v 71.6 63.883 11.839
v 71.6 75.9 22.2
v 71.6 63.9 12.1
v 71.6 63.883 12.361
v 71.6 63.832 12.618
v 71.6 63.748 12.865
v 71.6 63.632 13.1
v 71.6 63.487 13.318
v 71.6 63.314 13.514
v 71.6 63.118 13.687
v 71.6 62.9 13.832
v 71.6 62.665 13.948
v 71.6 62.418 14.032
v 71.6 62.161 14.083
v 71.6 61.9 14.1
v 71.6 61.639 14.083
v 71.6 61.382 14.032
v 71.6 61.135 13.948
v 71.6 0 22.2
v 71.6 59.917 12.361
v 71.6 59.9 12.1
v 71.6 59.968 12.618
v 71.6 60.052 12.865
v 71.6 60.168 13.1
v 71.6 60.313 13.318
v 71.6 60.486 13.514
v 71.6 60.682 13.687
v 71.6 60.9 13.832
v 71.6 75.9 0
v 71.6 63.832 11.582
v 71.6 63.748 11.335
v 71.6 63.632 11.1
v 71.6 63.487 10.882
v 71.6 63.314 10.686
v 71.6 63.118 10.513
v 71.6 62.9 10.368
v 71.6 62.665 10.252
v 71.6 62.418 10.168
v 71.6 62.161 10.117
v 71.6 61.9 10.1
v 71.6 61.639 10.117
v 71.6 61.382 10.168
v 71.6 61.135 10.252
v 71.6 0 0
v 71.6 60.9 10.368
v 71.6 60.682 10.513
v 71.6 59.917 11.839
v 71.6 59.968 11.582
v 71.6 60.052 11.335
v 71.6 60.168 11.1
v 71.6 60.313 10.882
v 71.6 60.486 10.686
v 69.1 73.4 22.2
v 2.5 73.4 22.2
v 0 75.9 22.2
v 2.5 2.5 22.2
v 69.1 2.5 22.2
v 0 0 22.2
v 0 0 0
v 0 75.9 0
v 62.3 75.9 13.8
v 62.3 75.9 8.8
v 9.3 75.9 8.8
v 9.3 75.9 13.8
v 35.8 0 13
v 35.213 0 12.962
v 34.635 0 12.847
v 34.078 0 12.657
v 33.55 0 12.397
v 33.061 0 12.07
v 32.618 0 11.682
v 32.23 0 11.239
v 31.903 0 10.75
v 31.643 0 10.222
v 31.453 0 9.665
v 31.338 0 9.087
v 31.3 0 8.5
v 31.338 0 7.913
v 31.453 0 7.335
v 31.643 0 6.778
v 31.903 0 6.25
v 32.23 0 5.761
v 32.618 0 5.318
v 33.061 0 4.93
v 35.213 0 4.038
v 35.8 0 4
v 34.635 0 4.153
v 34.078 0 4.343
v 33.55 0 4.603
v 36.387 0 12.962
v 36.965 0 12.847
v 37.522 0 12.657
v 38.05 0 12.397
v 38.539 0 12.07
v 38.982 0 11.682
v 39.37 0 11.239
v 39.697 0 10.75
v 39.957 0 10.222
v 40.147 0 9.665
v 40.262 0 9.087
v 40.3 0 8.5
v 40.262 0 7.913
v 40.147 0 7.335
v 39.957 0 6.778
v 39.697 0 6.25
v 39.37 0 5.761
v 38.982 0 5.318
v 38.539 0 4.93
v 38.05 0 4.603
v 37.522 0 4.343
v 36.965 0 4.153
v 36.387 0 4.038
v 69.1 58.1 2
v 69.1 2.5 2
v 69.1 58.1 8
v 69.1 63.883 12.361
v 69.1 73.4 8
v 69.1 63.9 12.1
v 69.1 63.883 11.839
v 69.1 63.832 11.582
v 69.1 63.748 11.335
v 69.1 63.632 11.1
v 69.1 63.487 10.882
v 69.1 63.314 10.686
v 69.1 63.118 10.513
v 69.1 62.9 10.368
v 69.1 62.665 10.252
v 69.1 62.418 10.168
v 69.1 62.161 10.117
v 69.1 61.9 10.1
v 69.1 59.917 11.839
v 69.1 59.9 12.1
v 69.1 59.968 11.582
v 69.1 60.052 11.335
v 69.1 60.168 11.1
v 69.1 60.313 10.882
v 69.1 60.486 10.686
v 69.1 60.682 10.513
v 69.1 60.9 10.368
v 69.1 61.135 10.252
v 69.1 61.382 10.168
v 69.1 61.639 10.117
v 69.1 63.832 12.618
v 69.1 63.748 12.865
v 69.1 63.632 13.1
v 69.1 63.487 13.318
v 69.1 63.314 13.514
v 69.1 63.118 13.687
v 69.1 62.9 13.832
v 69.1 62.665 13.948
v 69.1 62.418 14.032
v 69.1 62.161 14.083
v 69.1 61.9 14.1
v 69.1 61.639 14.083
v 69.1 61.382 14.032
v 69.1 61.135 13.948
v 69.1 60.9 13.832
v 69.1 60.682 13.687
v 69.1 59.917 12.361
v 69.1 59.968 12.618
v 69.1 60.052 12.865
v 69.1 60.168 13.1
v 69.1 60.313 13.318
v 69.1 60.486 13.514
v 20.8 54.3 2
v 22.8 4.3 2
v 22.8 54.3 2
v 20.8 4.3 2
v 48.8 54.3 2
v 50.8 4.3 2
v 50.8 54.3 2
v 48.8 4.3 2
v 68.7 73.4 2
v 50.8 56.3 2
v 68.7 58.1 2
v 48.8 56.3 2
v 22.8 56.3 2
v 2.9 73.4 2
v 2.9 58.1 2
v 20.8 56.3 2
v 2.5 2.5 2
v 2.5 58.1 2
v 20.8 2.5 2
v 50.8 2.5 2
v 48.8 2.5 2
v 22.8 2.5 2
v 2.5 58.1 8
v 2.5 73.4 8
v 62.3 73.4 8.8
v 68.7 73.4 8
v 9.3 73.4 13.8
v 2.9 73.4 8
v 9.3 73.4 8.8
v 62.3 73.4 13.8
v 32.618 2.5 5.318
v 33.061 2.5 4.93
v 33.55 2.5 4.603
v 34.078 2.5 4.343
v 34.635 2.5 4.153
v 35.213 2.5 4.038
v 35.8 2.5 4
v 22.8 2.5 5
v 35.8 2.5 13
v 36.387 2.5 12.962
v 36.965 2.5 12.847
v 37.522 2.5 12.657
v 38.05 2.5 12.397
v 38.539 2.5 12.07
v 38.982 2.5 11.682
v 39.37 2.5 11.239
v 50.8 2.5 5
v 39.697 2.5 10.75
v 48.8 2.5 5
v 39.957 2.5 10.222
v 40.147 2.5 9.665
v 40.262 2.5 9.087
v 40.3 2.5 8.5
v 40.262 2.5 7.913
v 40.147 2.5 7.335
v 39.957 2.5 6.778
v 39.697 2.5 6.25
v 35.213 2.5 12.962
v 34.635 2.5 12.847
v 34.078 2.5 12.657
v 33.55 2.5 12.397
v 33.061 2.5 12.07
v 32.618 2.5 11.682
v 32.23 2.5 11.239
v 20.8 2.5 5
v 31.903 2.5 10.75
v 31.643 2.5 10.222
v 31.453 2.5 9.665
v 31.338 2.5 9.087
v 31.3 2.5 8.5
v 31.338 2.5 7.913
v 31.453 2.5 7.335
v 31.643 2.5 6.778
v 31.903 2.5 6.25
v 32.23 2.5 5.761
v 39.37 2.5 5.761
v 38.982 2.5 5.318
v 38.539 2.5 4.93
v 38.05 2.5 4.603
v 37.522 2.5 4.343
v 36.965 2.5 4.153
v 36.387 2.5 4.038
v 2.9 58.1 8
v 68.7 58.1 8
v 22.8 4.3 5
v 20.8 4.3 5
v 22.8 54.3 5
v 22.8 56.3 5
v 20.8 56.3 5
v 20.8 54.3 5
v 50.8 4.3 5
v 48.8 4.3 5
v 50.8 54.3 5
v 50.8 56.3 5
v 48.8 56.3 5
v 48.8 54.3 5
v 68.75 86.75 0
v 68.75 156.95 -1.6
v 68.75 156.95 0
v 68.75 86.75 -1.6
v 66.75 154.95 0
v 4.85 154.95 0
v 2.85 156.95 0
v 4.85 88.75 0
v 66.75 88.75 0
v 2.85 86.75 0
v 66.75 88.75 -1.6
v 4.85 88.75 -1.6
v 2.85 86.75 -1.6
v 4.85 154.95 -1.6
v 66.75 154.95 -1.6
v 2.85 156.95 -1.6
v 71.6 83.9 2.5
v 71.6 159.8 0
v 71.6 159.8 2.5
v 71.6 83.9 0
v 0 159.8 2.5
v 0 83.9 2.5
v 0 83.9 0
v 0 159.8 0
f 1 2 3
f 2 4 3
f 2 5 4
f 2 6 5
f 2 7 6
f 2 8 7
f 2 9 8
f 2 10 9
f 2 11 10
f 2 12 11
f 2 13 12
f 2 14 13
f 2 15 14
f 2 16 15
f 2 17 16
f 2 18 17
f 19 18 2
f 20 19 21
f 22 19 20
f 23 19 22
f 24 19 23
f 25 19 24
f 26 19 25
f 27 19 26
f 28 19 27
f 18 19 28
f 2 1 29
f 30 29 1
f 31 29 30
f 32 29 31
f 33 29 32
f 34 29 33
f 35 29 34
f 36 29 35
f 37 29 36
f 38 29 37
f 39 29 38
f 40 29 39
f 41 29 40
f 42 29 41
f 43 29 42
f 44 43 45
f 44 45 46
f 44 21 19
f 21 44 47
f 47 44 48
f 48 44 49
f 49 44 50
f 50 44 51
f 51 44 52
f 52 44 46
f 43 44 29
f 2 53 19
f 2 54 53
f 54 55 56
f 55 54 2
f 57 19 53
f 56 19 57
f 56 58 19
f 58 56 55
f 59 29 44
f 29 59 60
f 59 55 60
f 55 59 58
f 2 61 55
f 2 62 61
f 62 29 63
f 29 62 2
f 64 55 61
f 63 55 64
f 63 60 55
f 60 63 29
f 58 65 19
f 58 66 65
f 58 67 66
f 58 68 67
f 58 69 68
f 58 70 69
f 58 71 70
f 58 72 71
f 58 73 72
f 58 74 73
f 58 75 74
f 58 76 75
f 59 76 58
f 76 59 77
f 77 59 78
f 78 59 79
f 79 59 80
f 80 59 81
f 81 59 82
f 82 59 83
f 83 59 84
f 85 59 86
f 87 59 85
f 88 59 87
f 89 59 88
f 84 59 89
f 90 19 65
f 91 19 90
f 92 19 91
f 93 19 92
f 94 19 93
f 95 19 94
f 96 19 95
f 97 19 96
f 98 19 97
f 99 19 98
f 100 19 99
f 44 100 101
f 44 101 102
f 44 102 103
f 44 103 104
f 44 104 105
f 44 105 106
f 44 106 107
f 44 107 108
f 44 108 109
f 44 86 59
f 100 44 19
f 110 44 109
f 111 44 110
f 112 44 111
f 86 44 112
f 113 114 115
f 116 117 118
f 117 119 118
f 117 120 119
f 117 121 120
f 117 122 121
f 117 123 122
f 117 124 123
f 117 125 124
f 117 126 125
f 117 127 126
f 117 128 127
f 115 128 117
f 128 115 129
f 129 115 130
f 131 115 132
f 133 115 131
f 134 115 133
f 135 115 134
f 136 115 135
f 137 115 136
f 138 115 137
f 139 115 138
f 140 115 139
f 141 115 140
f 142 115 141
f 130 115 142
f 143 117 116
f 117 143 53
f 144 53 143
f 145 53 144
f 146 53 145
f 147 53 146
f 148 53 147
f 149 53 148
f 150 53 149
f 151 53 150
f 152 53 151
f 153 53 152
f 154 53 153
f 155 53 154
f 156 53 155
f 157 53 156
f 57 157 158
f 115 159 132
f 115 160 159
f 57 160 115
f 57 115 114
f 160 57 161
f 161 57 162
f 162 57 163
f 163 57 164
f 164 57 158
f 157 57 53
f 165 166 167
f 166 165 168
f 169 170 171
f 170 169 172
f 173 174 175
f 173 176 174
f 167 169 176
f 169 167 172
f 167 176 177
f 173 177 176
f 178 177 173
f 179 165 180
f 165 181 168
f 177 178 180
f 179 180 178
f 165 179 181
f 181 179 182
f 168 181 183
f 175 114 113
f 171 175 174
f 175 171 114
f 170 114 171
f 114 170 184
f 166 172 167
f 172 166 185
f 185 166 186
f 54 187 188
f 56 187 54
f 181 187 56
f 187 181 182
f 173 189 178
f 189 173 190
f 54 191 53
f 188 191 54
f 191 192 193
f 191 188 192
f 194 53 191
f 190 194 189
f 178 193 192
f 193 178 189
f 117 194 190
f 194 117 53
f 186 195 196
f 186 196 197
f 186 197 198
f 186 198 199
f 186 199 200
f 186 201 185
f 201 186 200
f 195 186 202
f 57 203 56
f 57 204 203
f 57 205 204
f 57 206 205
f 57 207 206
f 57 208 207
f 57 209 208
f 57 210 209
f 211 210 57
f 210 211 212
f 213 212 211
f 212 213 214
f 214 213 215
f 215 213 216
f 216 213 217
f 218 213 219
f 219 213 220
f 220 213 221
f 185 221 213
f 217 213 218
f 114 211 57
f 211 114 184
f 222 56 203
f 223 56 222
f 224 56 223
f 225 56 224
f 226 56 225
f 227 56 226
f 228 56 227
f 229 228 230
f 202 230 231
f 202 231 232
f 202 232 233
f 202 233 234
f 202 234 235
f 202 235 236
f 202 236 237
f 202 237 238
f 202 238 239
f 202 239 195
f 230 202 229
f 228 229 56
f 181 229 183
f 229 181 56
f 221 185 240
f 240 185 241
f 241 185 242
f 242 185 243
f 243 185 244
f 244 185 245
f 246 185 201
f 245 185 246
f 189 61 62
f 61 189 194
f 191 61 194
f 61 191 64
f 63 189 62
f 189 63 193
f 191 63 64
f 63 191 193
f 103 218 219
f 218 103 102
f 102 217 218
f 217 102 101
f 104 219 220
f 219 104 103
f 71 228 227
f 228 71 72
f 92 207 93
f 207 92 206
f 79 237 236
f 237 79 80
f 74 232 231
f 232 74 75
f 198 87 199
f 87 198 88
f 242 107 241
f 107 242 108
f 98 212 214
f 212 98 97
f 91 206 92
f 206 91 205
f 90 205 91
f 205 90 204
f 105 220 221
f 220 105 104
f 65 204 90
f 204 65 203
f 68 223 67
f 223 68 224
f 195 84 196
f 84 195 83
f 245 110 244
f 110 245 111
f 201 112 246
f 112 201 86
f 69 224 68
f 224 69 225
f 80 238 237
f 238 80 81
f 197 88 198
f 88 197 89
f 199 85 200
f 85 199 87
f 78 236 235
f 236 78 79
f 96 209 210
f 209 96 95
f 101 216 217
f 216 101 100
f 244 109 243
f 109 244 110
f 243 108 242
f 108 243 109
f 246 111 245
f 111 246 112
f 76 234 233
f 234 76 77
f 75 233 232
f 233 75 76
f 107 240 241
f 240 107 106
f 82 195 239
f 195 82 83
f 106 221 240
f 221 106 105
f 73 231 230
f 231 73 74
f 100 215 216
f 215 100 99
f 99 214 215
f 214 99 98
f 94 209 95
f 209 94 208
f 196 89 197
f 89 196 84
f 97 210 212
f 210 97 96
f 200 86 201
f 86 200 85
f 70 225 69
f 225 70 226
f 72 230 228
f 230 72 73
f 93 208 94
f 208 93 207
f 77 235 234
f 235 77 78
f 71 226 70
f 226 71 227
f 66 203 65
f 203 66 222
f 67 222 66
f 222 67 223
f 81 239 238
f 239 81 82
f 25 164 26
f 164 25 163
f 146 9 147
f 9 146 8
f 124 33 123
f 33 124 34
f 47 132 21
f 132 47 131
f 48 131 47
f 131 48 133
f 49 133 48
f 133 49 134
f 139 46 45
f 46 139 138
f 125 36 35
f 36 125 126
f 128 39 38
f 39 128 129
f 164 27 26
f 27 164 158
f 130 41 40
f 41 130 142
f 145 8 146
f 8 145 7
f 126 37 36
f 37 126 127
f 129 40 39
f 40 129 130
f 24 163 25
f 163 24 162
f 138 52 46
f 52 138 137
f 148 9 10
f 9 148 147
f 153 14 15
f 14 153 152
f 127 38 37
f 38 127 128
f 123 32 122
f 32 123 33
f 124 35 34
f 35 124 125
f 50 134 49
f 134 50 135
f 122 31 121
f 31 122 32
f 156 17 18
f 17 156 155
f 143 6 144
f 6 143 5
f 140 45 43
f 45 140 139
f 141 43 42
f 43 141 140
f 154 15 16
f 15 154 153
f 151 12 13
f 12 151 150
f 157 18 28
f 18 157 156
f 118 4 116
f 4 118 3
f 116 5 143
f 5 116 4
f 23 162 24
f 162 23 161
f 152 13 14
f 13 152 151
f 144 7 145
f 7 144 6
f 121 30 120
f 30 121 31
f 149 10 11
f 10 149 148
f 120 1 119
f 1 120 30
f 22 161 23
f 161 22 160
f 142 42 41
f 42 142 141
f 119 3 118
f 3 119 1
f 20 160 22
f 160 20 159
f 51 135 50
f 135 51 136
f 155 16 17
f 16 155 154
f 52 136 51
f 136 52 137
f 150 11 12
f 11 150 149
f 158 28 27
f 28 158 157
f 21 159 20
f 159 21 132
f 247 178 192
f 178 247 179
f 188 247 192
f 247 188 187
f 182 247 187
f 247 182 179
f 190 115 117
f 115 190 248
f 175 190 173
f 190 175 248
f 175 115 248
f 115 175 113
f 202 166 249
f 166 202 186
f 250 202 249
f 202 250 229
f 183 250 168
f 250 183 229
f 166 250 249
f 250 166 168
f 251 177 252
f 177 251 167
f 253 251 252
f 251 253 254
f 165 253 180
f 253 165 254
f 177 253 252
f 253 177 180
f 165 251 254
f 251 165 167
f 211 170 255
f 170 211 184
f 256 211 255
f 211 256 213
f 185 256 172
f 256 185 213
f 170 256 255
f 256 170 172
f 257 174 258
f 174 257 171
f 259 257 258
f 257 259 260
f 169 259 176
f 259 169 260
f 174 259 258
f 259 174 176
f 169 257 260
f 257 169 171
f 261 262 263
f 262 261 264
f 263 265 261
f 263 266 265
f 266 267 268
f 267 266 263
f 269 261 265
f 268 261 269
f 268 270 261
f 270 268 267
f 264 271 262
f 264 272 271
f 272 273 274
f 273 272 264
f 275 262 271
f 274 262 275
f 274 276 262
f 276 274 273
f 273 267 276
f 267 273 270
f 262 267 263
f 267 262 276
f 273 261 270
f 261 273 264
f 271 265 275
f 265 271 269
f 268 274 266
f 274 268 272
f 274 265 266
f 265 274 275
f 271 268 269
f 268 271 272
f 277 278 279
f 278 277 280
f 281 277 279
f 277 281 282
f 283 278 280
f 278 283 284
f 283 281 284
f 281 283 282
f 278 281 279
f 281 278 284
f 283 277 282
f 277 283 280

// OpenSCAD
// ============================================================
//  CYBERTHREAD — printed enclosure (v0, parametric)
//  The coupler drops in at the TOP; fibres exit the top wall
//  and run up to the hair. The ESP32 sits in the body. USB
//  power enters the bottom (battery lives on your belt).
//  Prints as a tray (open top) + a friction-fit lid.
// ============================================================

/* ---- coupler outer size (match your coupler .scad output) ---- */
cpl_l = 65;     // length / hole-row.  144/m = 65,  30/m = 212
cpl_w = 18.6;   // width.              144/m = 18.6, 30/m = 16.6
cpl_h = 12.3;   // height

/* ---- ESP32 board bay   ### CONFIRM your board's real size ### ---- */
esp_l = 52;     // board length (38-pin devkit ~ 52; 30-pin ~ 48)
esp_w = 28;     // board width  (~ 25.4–28)
esp_h = 13;     // height incl. header pins

/* ---- build params ---- */
wall    = 2.5;
floor_t = 2.0;
clr     = 0.8;   // clearance around parts
gap     = 5;     // gap between coupler and ESP bay
usb_d   = 9;     // USB cable pass-through (fits a grommet)
mic_d   = 4;     // mic port
lip     = 1.6;   // lid lip depth
lip_clr = 0.35;  // lid fit clearance
$fn = 48;

/* ---- derived ---- */
in_x  = max(cpl_l, esp_w) + 2*clr;
in_y  = cpl_h + gap + esp_l + 2*clr;
in_z  = max(cpl_w, esp_h) + 2*clr;
out_x = in_x + 2*wall;
out_y = in_y + 2*wall;
tray_h = floor_t + in_z;

// key interior anchors
cpl_y0 = wall + in_y - cpl_h;      // coupler pushed against +Y wall
cpl_x0 = wall + (in_x-cpl_l)/2;
slot_z = floor_t + cpl_w/2;        // fibre row height
esp_y0 = wall + clr;               // ESP at the bottom (low Y)
esp_x0 = wall + (in_x-esp_w)/2;

module tray() {
  difference() {
    cube([out_x, out_y, tray_h]);                 // shell
    translate([wall, wall, floor_t])
      cube([in_x, in_y, in_z + 2]);               // hollow, open top

    // fibre exit slot in +Y wall, aligned to the hole row
    slot_len = cpl_l - 12;
    translate([out_x/2 - slot_len/2, out_y - wall - 0.6, slot_z - 2.5])
      cube([slot_len, wall + 1.2, 5]);

    // USB power entry, -Y wall, at ESP height
    translate([out_x/2, -0.6, floor_t + esp_h/2])
      rotate([-90,0,0]) cylinder(d=usb_d, h=wall+1.2);

    // mic port, +X side wall, up near the coupler end
    translate([out_x-wall-0.6, out_y - 14, floor_t + in_z/2])
      rotate([0,90,0]) cylinder(d=mic_d, h=wall+1.2);
  }

  // coupler locating ribs (stop it sliding in X, hold against +Y wall)
  for (x=[cpl_x0-2.4, cpl_x0+cpl_l+0.4])
    translate([x, cpl_y0-3, floor_t]) cube([2, cpl_h+3, min(cpl_w,6)]);

  // ESP corner nubs (board drops between them; tape/glue to secure)
  for (dx=[0, esp_w], dy=[0, esp_l])
    translate([esp_x0+dx-1, esp_y0+dy-1, floor_t]) cube([2,2,3]);
}

module lid() {
  translate([0, out_y + 8, 0]) {
    cube([out_x, out_y, wall]);                    // plate
    // lip that drops into the interior
    translate([wall+lip_clr, wall+lip_clr, -lip])
      difference(){
        cube([in_x-2*lip_clr, in_y-2*lip_clr, lip]);
        translate([2,2,-1]) cube([in_x-2*lip_clr-4, in_y-2*lip_clr-4, lip+2]);
      }
  }
}

tray();
lid();
